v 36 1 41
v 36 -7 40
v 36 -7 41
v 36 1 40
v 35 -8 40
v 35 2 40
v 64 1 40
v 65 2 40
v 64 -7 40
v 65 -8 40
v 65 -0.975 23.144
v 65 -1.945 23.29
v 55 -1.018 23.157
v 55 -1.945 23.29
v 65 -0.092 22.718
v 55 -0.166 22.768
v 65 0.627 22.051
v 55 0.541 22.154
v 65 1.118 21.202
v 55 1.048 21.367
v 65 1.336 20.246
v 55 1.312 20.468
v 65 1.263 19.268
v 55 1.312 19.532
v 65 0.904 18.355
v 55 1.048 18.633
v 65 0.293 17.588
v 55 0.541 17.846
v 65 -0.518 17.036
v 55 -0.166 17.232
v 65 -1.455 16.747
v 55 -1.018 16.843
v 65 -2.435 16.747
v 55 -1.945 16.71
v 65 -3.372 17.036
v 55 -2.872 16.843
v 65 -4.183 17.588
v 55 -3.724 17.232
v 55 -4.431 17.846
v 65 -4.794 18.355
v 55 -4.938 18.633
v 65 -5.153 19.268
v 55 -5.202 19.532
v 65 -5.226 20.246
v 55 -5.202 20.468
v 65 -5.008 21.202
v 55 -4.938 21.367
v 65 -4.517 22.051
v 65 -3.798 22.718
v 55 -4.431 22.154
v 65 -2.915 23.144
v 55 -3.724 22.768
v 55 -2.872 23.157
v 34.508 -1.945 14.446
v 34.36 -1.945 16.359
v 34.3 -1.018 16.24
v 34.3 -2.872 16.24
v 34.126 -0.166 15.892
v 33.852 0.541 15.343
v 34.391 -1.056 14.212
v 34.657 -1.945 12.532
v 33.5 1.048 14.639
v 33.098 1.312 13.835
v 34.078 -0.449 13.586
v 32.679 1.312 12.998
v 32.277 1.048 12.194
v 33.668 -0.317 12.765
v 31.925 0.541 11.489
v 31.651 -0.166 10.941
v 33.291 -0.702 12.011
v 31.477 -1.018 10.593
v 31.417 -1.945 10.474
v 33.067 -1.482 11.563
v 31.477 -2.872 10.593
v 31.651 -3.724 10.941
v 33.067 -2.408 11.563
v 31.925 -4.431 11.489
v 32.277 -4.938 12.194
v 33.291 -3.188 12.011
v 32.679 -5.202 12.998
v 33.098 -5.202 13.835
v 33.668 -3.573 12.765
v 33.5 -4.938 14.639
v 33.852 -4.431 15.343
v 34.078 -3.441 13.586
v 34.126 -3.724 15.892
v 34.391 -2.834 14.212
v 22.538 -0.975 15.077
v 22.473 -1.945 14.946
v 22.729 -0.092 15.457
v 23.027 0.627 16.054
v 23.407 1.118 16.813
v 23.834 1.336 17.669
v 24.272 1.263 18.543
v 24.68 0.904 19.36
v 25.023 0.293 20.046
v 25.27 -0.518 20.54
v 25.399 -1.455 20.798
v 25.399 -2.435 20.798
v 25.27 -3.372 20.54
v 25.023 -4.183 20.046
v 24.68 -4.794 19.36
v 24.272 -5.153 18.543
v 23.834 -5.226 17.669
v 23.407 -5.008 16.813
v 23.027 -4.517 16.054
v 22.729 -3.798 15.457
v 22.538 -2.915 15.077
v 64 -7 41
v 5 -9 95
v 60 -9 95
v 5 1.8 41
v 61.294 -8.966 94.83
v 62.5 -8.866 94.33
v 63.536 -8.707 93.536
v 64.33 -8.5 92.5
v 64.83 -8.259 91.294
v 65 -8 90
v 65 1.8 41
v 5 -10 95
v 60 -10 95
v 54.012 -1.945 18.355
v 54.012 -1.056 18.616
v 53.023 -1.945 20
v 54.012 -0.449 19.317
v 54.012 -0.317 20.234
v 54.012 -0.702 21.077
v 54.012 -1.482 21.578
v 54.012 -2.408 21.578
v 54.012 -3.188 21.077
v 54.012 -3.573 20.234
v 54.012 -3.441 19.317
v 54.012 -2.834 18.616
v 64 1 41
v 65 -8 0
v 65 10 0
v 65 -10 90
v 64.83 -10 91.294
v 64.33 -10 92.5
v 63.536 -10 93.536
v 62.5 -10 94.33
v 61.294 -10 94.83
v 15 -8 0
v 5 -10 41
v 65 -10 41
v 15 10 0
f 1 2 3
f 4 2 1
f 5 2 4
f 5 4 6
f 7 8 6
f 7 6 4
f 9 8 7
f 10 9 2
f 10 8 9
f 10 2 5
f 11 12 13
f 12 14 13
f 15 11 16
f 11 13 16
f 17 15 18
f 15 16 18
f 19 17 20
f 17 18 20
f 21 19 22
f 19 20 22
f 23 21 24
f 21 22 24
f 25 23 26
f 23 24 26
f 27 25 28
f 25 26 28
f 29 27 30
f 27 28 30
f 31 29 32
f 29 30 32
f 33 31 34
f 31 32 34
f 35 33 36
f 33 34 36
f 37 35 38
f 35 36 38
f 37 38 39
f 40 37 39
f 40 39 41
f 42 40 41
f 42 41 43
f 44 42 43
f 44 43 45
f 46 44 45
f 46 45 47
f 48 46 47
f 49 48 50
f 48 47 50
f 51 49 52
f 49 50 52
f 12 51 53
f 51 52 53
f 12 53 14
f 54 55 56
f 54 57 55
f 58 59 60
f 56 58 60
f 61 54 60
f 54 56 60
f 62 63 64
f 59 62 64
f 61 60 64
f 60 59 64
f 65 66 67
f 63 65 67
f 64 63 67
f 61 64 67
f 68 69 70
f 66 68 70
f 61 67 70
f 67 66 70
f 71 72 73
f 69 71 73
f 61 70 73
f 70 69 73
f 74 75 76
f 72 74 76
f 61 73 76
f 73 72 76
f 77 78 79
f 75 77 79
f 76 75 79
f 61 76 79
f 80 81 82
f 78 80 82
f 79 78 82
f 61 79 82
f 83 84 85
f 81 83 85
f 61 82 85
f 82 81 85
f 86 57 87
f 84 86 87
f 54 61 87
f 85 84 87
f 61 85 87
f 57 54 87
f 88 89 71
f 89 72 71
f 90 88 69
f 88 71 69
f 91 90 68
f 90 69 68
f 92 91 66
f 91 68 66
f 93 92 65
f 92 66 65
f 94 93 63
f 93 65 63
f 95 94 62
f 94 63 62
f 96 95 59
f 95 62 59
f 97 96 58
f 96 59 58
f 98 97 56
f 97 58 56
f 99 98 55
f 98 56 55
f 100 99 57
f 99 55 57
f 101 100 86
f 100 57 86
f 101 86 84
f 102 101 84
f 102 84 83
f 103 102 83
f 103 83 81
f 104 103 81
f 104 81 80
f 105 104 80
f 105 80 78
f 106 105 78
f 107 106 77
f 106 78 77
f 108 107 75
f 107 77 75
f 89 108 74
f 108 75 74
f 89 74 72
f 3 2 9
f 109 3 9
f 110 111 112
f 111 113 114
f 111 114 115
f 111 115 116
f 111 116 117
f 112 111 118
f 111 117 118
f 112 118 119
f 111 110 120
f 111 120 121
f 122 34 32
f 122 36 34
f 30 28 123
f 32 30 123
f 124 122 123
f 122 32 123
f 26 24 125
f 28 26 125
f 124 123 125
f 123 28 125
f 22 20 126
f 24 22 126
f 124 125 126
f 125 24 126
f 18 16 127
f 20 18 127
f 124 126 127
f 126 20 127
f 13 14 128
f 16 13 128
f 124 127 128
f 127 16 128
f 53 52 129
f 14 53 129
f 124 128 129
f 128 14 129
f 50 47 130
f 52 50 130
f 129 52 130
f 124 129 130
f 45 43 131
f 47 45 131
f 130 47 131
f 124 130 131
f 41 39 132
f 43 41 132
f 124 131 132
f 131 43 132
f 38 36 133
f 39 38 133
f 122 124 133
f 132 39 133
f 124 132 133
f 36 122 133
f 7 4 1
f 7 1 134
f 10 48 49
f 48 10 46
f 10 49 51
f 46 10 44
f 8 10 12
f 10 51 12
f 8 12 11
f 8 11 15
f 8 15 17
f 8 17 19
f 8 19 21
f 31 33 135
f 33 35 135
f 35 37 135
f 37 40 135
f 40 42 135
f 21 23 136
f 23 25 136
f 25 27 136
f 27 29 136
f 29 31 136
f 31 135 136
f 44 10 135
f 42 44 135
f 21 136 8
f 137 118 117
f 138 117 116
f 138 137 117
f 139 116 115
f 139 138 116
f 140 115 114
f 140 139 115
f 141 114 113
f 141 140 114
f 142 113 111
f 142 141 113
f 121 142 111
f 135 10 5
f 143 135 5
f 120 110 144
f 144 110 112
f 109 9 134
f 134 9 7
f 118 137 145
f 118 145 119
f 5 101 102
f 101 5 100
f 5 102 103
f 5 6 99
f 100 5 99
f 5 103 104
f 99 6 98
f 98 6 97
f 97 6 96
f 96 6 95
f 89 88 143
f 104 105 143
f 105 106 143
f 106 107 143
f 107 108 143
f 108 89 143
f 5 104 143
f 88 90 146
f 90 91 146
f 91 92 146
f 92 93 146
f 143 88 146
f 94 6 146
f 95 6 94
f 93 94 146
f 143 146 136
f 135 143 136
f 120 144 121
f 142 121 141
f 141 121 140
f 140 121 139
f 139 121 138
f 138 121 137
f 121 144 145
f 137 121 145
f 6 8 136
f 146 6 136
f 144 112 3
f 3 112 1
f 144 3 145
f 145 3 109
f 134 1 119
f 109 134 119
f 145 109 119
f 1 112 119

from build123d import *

# Parameters (mm, degrees)
ESBO_O1_W                                      = 130
ESBO_O1_H                                      = 20
RESSALTO_EXTRUS_O1_DEPTH                       = 95
CORTE_EXTRUS_O2_REACH                          = 22
CORTE_EXTRUS_O3_DEPTH                          = 1
CORTE_EXTRUS_O3_DEPTH_BACK                     = 61
BROCA_DE_ROSQUEAR_DE_CANO_PARA_TARRAXA_D_D     = 6.579997
BROCA_DE_ROSQUEAR_DE_CANO_PARA_TARRAXA_D_DEPTH = 10
BROCA_DE_ROSQUEAR_DE_CANO_PARA_TARRAXA_D_TIP   = 1.976830535
BROCA_DE_ROSQUEAR_DE_CANO_PARA_TARRA_2_D       = 6.579997
BROCA_DE_ROSQUEAR_DE_CANO_PARA_TARRA_2_DEPTH   = 10
BROCA_DE_ROSQUEAR_DE_CANO_PARA_TARRA_2_TIP     = 1.976830535
FILETE2_R                                      = 5
CORTE_EXTRUS_O4_REACH                          = 62
RESSALTO_EXTRUS_O2_REACH                       = 57
ESBO_O13_W                                     = 28
ESBO_O13_H                                     = 8
ESBO_O14_W                                     = 50
ESBO_O14_H                                     = 2
CORTE_EXTRUS_O5_DEPTH                          = 40.5


with BuildPart() as part:
    # Esboço1 → Ressalto-extrusão1 (new body)
    with BuildSketch(Plane.XY):
        Rectangle(ESBO_O1_W, ESBO_O1_H)
    extrude(amount=RESSALTO_EXTRUS_O1_DEPTH)

    # Esboço2 → Corte-extrusão2 (cut, up to next)
    with BuildSketch(Plane(origin=(0, 10, 0), x_dir=(1, 0, 0), z_dir=(0, 1, 0)), mode=Mode.PRIVATE) as corte_extrus_o2_sk1:
        Polygon((15, 0), (-65, 0), (-65, -95), (5, -95), (5, -41), (35, -41), (35, -40), align=None)
    corte_extrus_o2_tool1 = extrude(corte_extrus_o2_sk1.sketch, amount=-CORTE_EXTRUS_O2_REACH, mode=Mode.PRIVATE) & part.part
    add(corte_extrus_o2_tool1.solids().sort_by_distance((-24.897504, 10, 44.887255))[0], mode=Mode.SUBTRACT)

    # Esboço3 → Corte-extrusão3 (cut, two sides)
    with BuildSketch(Plane(origin=(65, 0, 0), x_dir=(0, 0, -1), z_dir=(1, 0, 0))) as corte_extrus_o3_sk:
        Polygon((200.200134404, 50.040026881), (0, 10), (-95, -9), (-295.200134404, -49.040026881), (-375.280188165, 351.360241926), (120.120080642, 450.440295688), align=None)
    extrude(amount=CORTE_EXTRUS_O3_DEPTH, mode=Mode.SUBTRACT)
    extrude(corte_extrus_o3_sk.sketch, amount=-CORTE_EXTRUS_O3_DEPTH_BACK, mode=Mode.SUBTRACT)

    # Broca de rosquear de cano para tarraxa d
    with Locations(Plane(origin=(65, 0, 0), x_dir=(0, 0, -1), z_dir=(1, 0, 0))):
        with Locations((-20, -1.945)):
            Hole(BROCA_DE_ROSQUEAR_DE_CANO_PARA_TARRAXA_D_D / 2, depth=BROCA_DE_ROSQUEAR_DE_CANO_PARA_TARRAXA_D_DEPTH)
            with Locations((0, 0, -(BROCA_DE_ROSQUEAR_DE_CANO_PARA_TARRAXA_D_DEPTH + BROCA_DE_ROSQUEAR_DE_CANO_PARA_TARRAXA_D_TIP / 2))):  # 118° drill point
                Cone(0, BROCA_DE_ROSQUEAR_DE_CANO_PARA_TARRAXA_D_D / 2, BROCA_DE_ROSQUEAR_DE_CANO_PARA_TARRAXA_D_TIP, mode=Mode.SUBTRACT)

    # Broca de rosquear de cano para tarra 2
    with Locations(Plane(origin=(12, 0, -6), x_dir=(0.447213595, 0, 0.894427191), z_dir=(-0.894427191, 0, 0.447213595))):
        with Locations((26.708203932, -1.945)):
            Hole(BROCA_DE_ROSQUEAR_DE_CANO_PARA_TARRA_2_D / 2, depth=BROCA_DE_ROSQUEAR_DE_CANO_PARA_TARRA_2_DEPTH)
            with Locations((0, 0, -(BROCA_DE_ROSQUEAR_DE_CANO_PARA_TARRA_2_DEPTH + BROCA_DE_ROSQUEAR_DE_CANO_PARA_TARRA_2_TIP / 2))):  # 118° drill point
                Cone(0, BROCA_DE_ROSQUEAR_DE_CANO_PARA_TARRA_2_D / 2, BROCA_DE_ROSQUEAR_DE_CANO_PARA_TARRA_2_TIP, mode=Mode.SUBTRACT)

    # Filete2
    filete2_edges = [part.edges().sort_by_distance(p)[0] for p in [
        (65, -9.5, 95),
    ]]
    fillet(filete2_edges, radius=FILETE2_R)

    # Esboço12 → Corte-extrusão4 (cut, up to next)
    with BuildSketch(Plane(origin=(65, 0, 0), x_dir=(0, 0, -1), z_dir=(1, 0, 0)), mode=Mode.PRIVATE) as corte_extrus_o4_sk1:
        Polygon((-41, -10), (-41, 1.8), (-40, 2), (-40, -10), align=None)
    corte_extrus_o4_tool1 = extrude(corte_extrus_o4_sk1.sketch, amount=-CORTE_EXTRUS_O4_REACH, mode=Mode.PRIVATE) & part.part
    add(corte_extrus_o4_tool1.solids().sort_by_distance((65, -4.04986, 40.498599))[0], mode=Mode.SUBTRACT)

    # Esboço13 → Ressalto-extrusão2 (add, up to next)
    with BuildSketch(Plane.XY.offset(40), mode=Mode.PRIVATE) as ressalto_extrus_o2_sk1:
        with Locations((50, -3)):
            Rectangle(ESBO_O13_W, ESBO_O13_H)
    ressalto_extrus_o2_tool1 = extrude(ressalto_extrus_o2_sk1.sketch, amount=RESSALTO_EXTRUS_O2_REACH, mode=Mode.PRIVATE) - part.part
    add(ressalto_extrus_o2_tool1.solids().sort_by_distance((50, -3, 40))[0])

    # Esboço14 → Corte-extrusão5 (cut)
    with BuildSketch(Plane(origin=(0, 0, 0), x_dir=(-1, 0, 0), z_dir=(0, 0, -1))):
        with Locations((-40, -9)):
            Rectangle(ESBO_O14_W, ESBO_O14_H)
    extrude(amount=-CORTE_EXTRUS_O5_DEPTH, mode=Mode.SUBTRACT)


solid = part.part
